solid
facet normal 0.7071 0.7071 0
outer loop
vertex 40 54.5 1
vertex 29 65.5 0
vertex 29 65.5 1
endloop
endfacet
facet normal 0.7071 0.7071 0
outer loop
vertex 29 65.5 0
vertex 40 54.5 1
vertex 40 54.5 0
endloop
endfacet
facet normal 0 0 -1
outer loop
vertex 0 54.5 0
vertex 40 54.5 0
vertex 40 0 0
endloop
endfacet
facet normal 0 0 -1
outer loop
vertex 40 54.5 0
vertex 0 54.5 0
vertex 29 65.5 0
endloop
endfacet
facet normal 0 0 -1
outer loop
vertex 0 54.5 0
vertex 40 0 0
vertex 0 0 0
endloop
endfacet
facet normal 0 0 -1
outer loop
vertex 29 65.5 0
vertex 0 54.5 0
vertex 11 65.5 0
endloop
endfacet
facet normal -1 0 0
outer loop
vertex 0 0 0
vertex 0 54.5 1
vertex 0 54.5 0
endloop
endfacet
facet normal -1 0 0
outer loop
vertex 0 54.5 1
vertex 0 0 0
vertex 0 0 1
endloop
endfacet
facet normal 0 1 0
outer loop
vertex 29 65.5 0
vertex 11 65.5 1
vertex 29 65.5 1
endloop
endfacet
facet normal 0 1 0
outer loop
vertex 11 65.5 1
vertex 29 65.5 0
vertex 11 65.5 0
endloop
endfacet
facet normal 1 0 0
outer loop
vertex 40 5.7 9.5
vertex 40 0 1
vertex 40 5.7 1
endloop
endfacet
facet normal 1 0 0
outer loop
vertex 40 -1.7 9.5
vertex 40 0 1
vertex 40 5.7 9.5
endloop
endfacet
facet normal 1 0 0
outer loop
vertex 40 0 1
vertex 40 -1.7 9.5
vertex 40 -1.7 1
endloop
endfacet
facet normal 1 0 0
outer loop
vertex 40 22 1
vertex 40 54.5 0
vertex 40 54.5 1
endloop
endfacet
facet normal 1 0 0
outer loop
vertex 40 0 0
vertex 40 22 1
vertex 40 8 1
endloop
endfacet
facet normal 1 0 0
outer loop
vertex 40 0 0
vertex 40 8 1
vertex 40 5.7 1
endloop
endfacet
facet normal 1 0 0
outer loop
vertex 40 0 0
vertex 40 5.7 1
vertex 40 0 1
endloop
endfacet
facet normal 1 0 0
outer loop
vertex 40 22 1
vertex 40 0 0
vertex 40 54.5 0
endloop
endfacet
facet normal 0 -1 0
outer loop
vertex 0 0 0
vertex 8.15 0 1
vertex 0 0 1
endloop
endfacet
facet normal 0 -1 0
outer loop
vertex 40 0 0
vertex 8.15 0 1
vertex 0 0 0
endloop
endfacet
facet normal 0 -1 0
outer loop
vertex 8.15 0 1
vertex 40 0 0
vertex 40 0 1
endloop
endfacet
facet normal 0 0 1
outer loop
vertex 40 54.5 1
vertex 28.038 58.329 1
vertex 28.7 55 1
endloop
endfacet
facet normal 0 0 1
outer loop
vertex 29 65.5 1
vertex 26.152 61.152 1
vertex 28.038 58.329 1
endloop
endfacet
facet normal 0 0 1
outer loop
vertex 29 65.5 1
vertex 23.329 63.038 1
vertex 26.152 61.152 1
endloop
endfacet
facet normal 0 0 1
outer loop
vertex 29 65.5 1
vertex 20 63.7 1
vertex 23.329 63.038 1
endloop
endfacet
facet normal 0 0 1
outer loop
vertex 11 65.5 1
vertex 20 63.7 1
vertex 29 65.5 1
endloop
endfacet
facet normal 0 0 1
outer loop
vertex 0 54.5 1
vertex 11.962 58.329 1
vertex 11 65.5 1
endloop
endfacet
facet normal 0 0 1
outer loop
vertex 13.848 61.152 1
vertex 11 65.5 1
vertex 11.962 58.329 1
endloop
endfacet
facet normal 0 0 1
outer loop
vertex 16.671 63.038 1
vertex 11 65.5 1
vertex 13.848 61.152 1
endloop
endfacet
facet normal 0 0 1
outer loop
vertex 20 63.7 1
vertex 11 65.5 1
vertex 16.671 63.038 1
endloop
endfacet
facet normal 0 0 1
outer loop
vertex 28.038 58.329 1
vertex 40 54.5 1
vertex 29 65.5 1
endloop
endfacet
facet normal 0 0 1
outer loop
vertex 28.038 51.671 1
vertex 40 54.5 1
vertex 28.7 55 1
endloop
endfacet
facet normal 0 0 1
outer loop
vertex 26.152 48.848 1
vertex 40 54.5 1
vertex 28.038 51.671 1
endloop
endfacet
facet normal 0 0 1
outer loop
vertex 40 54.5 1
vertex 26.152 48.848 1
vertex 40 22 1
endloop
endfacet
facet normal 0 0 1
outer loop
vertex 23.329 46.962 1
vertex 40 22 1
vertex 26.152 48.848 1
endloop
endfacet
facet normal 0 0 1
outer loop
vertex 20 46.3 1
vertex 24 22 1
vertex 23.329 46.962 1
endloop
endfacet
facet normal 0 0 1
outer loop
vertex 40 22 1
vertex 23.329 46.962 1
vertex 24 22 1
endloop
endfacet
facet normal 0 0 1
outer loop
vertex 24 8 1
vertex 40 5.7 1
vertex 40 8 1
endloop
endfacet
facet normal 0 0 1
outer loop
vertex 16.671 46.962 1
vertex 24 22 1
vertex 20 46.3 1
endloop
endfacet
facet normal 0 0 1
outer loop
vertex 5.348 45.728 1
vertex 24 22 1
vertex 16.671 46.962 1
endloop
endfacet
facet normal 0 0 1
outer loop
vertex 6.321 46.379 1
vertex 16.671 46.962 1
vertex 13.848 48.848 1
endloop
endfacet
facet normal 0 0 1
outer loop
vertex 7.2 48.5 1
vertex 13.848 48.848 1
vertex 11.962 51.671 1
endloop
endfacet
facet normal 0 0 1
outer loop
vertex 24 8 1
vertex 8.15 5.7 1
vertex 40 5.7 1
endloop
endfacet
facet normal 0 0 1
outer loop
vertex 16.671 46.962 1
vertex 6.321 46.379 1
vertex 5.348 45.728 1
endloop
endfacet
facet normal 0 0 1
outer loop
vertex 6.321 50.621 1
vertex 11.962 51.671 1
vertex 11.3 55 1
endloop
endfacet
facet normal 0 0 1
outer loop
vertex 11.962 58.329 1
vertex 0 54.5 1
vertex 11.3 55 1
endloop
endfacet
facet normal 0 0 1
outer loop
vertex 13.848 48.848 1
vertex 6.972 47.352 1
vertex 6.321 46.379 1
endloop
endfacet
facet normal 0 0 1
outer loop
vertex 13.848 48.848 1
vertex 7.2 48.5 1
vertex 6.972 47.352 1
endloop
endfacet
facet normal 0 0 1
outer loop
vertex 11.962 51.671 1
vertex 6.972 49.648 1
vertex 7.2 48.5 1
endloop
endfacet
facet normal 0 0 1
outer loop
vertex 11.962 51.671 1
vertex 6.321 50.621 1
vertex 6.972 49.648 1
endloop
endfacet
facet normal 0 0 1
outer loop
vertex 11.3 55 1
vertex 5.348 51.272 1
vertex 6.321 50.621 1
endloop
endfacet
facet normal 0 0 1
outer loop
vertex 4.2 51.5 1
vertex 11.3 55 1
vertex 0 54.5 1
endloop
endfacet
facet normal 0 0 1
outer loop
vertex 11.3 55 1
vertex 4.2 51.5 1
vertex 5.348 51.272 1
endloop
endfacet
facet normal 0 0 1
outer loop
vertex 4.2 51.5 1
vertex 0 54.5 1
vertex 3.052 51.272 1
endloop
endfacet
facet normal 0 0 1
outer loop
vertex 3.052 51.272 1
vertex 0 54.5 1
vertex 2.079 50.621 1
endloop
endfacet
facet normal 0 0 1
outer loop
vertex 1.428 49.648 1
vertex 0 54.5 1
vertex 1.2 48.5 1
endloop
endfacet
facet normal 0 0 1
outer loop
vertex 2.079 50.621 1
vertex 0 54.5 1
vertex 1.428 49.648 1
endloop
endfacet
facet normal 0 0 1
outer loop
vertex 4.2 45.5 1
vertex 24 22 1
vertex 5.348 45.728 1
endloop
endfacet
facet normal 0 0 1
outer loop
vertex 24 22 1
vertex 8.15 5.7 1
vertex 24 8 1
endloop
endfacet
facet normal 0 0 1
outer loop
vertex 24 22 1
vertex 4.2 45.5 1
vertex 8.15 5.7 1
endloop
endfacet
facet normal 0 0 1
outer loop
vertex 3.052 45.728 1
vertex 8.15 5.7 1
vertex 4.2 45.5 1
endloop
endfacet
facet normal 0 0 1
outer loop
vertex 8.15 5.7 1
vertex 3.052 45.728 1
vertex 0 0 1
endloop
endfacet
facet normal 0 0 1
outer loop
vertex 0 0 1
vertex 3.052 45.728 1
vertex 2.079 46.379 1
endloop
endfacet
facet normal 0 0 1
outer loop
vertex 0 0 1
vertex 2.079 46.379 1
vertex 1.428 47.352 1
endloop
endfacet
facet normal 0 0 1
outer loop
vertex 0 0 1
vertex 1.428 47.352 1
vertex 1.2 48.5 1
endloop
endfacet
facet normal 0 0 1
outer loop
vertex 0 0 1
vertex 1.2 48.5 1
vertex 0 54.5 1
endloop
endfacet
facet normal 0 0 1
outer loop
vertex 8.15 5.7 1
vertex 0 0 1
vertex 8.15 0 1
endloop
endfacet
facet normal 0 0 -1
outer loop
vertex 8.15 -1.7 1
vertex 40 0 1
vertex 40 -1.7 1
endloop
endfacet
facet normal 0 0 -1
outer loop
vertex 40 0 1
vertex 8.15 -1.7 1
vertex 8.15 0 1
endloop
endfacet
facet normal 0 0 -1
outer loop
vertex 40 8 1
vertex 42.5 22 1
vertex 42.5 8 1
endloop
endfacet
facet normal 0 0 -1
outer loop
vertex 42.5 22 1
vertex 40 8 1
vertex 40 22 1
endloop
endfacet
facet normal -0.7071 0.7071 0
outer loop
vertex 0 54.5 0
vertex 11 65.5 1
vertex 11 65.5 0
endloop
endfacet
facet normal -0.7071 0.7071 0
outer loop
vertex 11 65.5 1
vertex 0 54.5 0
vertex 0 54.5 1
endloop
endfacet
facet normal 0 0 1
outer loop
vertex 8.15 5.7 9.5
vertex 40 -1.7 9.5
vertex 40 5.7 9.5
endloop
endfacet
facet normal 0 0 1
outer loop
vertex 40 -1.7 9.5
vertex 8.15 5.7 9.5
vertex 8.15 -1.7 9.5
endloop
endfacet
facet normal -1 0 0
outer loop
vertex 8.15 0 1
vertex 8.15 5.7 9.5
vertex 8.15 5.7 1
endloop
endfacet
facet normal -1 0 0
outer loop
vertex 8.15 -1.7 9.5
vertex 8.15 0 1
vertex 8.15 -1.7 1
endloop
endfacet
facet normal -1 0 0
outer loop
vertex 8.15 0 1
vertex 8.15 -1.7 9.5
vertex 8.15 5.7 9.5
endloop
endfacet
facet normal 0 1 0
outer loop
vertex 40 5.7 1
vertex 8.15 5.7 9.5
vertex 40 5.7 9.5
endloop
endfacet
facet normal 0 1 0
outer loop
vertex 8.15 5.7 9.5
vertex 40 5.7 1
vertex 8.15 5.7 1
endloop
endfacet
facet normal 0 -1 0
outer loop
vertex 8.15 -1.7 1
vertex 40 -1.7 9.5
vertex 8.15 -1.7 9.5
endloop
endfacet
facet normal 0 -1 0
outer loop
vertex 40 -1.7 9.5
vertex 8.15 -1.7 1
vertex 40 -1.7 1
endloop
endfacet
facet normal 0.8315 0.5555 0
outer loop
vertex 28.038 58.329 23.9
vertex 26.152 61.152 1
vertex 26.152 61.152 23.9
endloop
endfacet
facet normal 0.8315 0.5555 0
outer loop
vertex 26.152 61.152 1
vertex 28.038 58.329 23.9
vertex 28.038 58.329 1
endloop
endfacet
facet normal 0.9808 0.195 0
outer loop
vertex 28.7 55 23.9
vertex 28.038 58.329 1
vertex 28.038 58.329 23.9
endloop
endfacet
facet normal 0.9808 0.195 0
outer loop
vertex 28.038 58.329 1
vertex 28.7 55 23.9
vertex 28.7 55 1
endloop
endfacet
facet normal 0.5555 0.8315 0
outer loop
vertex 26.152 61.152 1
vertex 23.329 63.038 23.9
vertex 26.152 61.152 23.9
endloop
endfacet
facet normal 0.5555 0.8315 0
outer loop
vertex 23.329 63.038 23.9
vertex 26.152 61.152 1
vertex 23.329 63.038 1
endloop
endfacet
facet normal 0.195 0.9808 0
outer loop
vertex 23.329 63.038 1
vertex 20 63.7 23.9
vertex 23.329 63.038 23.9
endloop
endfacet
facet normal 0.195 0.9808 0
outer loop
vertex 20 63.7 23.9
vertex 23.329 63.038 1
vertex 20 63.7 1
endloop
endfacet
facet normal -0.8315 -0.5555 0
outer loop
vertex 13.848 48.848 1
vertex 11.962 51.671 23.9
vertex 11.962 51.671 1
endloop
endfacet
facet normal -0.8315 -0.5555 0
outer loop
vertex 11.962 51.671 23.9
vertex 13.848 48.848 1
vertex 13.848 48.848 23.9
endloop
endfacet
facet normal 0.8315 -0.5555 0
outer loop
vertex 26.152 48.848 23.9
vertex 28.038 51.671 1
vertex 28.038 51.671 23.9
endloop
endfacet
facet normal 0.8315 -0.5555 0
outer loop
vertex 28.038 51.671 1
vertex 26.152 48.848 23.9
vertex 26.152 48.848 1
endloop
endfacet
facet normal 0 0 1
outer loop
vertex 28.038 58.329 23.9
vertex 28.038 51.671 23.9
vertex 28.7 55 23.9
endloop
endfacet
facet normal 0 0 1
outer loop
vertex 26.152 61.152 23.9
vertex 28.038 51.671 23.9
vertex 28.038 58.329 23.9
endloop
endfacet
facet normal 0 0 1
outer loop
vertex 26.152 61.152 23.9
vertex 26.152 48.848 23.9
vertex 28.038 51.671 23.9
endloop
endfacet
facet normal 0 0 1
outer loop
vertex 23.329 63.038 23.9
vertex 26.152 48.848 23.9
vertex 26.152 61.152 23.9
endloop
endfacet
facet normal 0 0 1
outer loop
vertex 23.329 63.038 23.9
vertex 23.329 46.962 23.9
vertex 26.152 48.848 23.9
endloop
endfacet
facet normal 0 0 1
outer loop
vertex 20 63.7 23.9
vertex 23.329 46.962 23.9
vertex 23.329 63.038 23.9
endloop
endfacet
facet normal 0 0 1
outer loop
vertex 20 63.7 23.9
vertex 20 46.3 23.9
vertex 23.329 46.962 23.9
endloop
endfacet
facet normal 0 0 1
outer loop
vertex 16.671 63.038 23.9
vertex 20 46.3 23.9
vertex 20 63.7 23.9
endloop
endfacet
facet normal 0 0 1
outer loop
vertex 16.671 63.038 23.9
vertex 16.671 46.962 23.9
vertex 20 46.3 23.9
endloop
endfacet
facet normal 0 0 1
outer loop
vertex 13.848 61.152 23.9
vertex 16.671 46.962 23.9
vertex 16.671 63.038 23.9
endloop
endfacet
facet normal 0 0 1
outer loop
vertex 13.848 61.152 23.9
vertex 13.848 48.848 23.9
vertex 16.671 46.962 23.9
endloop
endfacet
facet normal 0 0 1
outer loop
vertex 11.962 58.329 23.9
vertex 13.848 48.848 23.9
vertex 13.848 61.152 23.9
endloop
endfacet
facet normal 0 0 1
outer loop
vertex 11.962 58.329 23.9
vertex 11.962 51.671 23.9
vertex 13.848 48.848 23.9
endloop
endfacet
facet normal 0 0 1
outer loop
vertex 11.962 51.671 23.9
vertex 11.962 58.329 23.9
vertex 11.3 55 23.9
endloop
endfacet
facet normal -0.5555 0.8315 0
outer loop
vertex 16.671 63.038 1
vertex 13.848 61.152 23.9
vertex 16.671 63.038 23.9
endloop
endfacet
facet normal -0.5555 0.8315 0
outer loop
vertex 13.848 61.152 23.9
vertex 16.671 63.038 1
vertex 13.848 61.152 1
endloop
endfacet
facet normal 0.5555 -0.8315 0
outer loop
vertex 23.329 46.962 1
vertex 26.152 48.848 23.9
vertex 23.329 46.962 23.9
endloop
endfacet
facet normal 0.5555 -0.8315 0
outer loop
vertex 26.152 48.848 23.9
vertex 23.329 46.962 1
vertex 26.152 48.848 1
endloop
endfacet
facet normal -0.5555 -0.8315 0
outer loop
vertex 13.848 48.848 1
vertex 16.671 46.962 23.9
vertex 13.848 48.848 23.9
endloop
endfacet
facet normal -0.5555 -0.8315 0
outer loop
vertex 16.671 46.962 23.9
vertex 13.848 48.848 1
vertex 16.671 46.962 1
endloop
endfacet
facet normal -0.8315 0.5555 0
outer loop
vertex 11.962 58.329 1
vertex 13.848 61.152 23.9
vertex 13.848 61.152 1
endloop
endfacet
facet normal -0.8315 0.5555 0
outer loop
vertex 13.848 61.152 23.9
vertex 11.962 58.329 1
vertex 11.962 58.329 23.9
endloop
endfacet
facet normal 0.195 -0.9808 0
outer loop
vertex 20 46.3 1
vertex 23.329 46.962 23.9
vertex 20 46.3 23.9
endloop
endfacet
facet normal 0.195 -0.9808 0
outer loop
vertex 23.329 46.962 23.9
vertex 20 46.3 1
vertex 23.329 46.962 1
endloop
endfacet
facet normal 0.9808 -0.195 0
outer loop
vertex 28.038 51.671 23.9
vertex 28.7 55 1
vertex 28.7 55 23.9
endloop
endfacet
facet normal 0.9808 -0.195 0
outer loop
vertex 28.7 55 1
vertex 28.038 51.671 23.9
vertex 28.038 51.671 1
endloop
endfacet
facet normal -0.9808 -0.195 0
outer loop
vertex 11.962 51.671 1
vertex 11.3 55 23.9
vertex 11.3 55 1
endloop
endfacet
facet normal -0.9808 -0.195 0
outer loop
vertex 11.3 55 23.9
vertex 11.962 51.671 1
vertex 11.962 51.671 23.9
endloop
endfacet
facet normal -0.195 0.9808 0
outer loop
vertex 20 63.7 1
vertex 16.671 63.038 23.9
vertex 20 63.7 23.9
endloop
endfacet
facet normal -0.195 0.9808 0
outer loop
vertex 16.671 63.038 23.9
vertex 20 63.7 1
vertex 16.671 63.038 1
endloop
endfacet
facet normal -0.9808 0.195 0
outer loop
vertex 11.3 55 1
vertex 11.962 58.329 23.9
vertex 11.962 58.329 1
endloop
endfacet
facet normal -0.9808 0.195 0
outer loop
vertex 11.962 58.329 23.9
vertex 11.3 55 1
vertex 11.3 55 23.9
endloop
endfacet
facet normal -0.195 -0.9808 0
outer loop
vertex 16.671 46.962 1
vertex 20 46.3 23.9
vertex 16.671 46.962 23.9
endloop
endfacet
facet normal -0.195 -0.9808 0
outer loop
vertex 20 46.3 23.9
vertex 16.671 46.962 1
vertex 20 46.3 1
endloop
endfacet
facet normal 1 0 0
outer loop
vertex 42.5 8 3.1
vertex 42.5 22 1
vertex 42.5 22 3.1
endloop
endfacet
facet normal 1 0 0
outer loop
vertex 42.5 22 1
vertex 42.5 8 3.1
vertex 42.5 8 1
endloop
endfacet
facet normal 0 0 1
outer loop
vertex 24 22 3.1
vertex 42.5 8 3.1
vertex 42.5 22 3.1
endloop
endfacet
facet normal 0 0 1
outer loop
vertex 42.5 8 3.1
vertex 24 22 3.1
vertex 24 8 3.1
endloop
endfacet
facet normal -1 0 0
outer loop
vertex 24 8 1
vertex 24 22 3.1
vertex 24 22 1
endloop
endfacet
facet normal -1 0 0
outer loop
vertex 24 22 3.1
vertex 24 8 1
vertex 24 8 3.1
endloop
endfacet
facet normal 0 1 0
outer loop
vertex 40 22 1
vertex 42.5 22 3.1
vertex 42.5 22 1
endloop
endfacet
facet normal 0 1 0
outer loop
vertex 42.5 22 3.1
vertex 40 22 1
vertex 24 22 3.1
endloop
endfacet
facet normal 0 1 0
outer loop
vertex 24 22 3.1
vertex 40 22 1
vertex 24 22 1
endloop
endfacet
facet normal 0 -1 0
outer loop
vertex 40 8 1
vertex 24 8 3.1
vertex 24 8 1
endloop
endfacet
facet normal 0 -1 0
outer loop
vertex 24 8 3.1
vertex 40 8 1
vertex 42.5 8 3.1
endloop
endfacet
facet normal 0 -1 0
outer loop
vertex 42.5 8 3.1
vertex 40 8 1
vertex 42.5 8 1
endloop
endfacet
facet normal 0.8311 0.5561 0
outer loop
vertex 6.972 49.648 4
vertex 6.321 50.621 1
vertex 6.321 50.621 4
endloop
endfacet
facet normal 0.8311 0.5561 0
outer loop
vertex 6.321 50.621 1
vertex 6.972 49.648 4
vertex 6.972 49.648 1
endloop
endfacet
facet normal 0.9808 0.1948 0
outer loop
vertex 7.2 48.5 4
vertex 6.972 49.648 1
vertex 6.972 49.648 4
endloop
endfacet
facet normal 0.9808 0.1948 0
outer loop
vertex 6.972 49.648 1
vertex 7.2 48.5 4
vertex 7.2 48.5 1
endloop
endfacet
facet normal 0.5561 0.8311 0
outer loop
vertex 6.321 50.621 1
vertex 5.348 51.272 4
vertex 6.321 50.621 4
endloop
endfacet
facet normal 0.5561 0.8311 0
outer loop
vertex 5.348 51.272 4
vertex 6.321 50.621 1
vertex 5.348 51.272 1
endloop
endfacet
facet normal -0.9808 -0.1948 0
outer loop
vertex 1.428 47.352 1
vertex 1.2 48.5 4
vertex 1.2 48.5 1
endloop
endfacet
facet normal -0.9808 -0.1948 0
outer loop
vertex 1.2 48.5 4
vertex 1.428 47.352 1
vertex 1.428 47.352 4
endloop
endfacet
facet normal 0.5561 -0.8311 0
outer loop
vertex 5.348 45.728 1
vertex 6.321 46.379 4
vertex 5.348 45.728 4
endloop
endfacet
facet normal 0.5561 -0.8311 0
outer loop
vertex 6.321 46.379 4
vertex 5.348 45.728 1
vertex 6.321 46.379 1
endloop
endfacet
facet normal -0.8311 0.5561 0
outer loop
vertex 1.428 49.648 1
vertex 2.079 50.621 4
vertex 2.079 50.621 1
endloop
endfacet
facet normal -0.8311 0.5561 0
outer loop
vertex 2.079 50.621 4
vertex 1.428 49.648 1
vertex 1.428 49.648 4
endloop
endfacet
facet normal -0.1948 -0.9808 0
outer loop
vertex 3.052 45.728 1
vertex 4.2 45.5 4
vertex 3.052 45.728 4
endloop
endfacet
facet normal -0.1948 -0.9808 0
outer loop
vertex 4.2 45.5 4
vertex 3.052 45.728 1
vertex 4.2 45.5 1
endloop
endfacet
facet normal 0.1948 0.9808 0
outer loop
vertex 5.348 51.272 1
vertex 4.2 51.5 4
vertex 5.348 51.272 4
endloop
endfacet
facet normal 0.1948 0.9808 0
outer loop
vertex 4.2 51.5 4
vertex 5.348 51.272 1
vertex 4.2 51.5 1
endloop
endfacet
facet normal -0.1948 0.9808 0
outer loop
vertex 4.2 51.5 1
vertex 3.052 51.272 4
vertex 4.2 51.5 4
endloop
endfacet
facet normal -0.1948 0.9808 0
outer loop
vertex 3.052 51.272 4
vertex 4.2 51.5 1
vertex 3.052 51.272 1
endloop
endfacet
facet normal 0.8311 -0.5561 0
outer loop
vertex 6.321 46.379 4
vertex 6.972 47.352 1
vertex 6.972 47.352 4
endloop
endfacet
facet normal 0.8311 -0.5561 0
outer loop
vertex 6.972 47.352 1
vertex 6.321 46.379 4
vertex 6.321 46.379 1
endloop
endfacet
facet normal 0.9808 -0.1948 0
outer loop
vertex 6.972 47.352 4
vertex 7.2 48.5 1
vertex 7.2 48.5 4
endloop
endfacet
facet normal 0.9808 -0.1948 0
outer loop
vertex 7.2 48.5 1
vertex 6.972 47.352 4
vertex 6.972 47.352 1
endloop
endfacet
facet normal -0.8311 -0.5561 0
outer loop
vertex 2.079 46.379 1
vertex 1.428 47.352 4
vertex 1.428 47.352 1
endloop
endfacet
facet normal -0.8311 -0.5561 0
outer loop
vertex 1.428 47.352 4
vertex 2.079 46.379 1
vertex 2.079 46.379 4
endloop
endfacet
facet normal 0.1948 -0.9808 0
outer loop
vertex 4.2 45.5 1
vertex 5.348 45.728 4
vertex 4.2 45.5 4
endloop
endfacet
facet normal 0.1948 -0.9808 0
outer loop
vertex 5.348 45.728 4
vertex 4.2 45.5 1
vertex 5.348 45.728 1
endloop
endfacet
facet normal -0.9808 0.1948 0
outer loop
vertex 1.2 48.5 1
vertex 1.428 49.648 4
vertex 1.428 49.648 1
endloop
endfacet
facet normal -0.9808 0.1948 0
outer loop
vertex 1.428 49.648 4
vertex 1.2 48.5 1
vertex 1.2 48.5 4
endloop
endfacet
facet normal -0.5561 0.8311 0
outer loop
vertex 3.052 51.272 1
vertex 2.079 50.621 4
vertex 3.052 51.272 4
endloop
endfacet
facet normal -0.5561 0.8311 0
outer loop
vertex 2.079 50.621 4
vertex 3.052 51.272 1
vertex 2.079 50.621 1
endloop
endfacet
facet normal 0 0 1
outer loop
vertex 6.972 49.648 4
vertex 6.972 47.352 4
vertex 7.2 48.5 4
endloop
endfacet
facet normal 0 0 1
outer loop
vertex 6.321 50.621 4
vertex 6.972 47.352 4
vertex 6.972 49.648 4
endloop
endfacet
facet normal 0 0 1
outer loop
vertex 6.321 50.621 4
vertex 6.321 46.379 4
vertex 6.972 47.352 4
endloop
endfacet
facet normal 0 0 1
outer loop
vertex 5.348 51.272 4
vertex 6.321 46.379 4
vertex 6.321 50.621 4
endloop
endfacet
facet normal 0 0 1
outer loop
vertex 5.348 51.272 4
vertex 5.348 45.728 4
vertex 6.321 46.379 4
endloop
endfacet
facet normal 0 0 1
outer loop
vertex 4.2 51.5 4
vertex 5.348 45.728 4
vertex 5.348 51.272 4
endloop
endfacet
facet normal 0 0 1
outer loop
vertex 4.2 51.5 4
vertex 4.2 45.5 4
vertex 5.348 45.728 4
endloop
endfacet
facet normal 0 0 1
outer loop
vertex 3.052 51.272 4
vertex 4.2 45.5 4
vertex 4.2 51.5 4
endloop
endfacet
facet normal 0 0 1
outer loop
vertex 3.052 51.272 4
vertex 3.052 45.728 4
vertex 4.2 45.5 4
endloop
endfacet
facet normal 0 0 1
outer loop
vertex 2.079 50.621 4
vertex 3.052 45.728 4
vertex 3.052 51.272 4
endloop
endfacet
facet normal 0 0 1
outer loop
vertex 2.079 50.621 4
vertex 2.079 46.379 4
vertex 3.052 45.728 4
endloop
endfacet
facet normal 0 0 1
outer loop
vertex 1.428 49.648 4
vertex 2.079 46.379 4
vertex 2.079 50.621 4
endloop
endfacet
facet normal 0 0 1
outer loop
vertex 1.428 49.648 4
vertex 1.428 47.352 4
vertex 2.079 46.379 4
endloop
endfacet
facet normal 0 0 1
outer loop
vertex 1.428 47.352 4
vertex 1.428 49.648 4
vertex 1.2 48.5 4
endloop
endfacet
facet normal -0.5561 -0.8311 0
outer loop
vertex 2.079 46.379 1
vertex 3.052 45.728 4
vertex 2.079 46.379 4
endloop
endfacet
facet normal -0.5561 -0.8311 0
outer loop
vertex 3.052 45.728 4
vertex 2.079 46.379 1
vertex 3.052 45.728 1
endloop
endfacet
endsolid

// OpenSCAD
// file: hackhd_dimensions.scad
// HackHD Module Dimensions (mm)

hhd_w=40.0; // HackHD width
hhd_h=65.5; // HackHD height
hhd_corner_w=11.0; // HackHD corner cutout width
hhd_corner_h=11.0; // HackHD corner cutout height
hhd_pcb_th=1.0; // HackHD PCB thickness

// Front (Camera-side) Features

hhd_cam_rel_rhs=20.0; // Camera position relative to RHS
hhd_cam_rel_top=10.5; // Camera position relative to top edge

hhd_cam_bolts_rel_top=hhd_cam_rel_top; // Bolt holes around camera module 
hhd_anchor_bolt_rel_rhs=hhd_cam_rel_rhs; // Anchor bolt position relative to RHS

// RHS measurements

hhd_cam_lens_rel_bck=23.9; // Camera lens relative to back
hhd_cam_lens_d=17.4; // Camera lens diameter

hhd_terms_rel_bck=9.5; // Terminal block height relative to back

hhd_terms_h=7.4; // Terminal block measured height

// Back Features

hhd_terms_w_rel_rhs=31.85; // Terminal block width relative to RHS (looking from front)
hhd_terms_rel_top=67.2; // Terminal block edge relative to top.

hhd_bolt_d=2.1; // Bolt hole diameter
hhd_bolt_surround_d=5.0; // Measured bolt surround diameter

hhd_cam_bolts_dx=31.0; // Bolt hole separation, centered around camera module.

hhd_anchor_bolt_rel_top=57.7; // Anchor bolt position relative to top

// Micro SD card slot measurements
hhd_socket_rel_top=43.5; // Micro SD socket position relative to top
hhd_socket_h=14.0; // Micro SD socket height
hhd_socket_dx=2.5; // Micro SD socket space beyond RHS
hhd_socket_rel_rhs=16.0; // Micro SD socket position relative to RHS
hhd_socket_rel_bck=3.1; // Micro SD socket height relative to back

// Microphone measurements
hhd_mic_edge_rel_top=14.0; // Microphone edge position relative to top
hhd_mic_edge_rel_lhs=1.2; // Microphone edge position relative to LHS
hhd_mic_d=6.0; // Microphone diameter
hhd_mic_rel_bck=4.0; // Microphone surface relative to back
// main file
// HackHD Parts

include <hackhd_dimensions.scad>

$fn=16;

render_part="hackhd_pcb";
render_part="hackhd_pcb with holes";
render_part="hackhd_body_blank";

module hackhd_pcb_2d() {
  hull() {
    square([hhd_w,hhd_h-hhd_corner_h],center=false);
    translate([hhd_corner_w,hhd_h-hhd_corner_h])
	square([hhd_w-2*hhd_corner_w,hhd_corner_h],center=false);
  }
}

module hackhd_pcb() {
  linear_extrude(height=hhd_pcb_th) hackhd_pcb_2d();
}

if(render_part=="hackhd_pcb") {
  echo("Rendering hackhd_pcb()...");
  hackhd_pcb();
}

module hackhd_cam_bolt_holes_2d() {
  translate([hhd_w-hhd_cam_rel_rhs,hhd_h-hhd_cam_bolts_rel_top]) {
	translate([-hhd_cam_bolts_dx/2,0]) circle(r=hhd_bolt_d/2);
	translate([ hhd_cam_bolts_dx/2,0]) circle(r=hhd_bolt_d/2);
  }
}

module hackhd_anchor_bolt_hole_2d() {
  translate([hhd_w-hhd_anchor_bolt_rel_rhs,hhd_h-hhd_anchor_bolt_rel_top]) circle(r=hhd_bolt_d/2);
}

if(render_part=="hackhd_pcb with holes") {
  linear_extrude(height=hhd_pcb_th) difference() {
    hackhd_pcb_2d();
    hackhd_cam_bolt_holes_2d();
    hackhd_anchor_bolt_hole_2d();
  }
}

module hackhd_terminal_block() {
  translate([hhd_w-hhd_terms_w_rel_rhs,hhd_h-hhd_terms_rel_top,hhd_pcb_th])
    cube([hhd_terms_w_rel_rhs,hhd_terms_h,hhd_terms_rel_bck-hhd_pcb_th],center=false);
}

module hackhd_cam_lens() {
  translate([hhd_w-hhd_cam_rel_rhs,hhd_h-hhd_cam_rel_top,0])
    cylinder(r=hhd_cam_lens_d/2,h=hhd_cam_lens_rel_bck,center=false);
}

module hackhd_microsd() {
  translate([hhd_w-hhd_socket_rel_rhs,hhd_h-hhd_socket_rel_top-hhd_socket_h,hhd_pcb_th])
    cube([hhd_socket_rel_rhs+hhd_socket_dx,hhd_socket_h,hhd_socket_rel_bck-hhd_pcb_th],center=false);
}

module hackhd_mic() {
  translate([hhd_mic_edge_rel_lhs+hhd_mic_d/2,hhd_h-hhd_mic_edge_rel_top-hhd_mic_d/2,hhd_pcb_th])
    cylinder(r=hhd_mic_d/2,h=hhd_mic_rel_bck-hhd_pcb_th,center=false);
}

module hackhd_body_blank() {
  hackhd_pcb();
  hackhd_terminal_block();
  hackhd_cam_lens();
  hackhd_microsd();
  hackhd_mic();
}

if(render_part=="hackhd_body_blank") {
  echo("Rendering hackhd_body_blank()...");
  hackhd_body_blank();
}
